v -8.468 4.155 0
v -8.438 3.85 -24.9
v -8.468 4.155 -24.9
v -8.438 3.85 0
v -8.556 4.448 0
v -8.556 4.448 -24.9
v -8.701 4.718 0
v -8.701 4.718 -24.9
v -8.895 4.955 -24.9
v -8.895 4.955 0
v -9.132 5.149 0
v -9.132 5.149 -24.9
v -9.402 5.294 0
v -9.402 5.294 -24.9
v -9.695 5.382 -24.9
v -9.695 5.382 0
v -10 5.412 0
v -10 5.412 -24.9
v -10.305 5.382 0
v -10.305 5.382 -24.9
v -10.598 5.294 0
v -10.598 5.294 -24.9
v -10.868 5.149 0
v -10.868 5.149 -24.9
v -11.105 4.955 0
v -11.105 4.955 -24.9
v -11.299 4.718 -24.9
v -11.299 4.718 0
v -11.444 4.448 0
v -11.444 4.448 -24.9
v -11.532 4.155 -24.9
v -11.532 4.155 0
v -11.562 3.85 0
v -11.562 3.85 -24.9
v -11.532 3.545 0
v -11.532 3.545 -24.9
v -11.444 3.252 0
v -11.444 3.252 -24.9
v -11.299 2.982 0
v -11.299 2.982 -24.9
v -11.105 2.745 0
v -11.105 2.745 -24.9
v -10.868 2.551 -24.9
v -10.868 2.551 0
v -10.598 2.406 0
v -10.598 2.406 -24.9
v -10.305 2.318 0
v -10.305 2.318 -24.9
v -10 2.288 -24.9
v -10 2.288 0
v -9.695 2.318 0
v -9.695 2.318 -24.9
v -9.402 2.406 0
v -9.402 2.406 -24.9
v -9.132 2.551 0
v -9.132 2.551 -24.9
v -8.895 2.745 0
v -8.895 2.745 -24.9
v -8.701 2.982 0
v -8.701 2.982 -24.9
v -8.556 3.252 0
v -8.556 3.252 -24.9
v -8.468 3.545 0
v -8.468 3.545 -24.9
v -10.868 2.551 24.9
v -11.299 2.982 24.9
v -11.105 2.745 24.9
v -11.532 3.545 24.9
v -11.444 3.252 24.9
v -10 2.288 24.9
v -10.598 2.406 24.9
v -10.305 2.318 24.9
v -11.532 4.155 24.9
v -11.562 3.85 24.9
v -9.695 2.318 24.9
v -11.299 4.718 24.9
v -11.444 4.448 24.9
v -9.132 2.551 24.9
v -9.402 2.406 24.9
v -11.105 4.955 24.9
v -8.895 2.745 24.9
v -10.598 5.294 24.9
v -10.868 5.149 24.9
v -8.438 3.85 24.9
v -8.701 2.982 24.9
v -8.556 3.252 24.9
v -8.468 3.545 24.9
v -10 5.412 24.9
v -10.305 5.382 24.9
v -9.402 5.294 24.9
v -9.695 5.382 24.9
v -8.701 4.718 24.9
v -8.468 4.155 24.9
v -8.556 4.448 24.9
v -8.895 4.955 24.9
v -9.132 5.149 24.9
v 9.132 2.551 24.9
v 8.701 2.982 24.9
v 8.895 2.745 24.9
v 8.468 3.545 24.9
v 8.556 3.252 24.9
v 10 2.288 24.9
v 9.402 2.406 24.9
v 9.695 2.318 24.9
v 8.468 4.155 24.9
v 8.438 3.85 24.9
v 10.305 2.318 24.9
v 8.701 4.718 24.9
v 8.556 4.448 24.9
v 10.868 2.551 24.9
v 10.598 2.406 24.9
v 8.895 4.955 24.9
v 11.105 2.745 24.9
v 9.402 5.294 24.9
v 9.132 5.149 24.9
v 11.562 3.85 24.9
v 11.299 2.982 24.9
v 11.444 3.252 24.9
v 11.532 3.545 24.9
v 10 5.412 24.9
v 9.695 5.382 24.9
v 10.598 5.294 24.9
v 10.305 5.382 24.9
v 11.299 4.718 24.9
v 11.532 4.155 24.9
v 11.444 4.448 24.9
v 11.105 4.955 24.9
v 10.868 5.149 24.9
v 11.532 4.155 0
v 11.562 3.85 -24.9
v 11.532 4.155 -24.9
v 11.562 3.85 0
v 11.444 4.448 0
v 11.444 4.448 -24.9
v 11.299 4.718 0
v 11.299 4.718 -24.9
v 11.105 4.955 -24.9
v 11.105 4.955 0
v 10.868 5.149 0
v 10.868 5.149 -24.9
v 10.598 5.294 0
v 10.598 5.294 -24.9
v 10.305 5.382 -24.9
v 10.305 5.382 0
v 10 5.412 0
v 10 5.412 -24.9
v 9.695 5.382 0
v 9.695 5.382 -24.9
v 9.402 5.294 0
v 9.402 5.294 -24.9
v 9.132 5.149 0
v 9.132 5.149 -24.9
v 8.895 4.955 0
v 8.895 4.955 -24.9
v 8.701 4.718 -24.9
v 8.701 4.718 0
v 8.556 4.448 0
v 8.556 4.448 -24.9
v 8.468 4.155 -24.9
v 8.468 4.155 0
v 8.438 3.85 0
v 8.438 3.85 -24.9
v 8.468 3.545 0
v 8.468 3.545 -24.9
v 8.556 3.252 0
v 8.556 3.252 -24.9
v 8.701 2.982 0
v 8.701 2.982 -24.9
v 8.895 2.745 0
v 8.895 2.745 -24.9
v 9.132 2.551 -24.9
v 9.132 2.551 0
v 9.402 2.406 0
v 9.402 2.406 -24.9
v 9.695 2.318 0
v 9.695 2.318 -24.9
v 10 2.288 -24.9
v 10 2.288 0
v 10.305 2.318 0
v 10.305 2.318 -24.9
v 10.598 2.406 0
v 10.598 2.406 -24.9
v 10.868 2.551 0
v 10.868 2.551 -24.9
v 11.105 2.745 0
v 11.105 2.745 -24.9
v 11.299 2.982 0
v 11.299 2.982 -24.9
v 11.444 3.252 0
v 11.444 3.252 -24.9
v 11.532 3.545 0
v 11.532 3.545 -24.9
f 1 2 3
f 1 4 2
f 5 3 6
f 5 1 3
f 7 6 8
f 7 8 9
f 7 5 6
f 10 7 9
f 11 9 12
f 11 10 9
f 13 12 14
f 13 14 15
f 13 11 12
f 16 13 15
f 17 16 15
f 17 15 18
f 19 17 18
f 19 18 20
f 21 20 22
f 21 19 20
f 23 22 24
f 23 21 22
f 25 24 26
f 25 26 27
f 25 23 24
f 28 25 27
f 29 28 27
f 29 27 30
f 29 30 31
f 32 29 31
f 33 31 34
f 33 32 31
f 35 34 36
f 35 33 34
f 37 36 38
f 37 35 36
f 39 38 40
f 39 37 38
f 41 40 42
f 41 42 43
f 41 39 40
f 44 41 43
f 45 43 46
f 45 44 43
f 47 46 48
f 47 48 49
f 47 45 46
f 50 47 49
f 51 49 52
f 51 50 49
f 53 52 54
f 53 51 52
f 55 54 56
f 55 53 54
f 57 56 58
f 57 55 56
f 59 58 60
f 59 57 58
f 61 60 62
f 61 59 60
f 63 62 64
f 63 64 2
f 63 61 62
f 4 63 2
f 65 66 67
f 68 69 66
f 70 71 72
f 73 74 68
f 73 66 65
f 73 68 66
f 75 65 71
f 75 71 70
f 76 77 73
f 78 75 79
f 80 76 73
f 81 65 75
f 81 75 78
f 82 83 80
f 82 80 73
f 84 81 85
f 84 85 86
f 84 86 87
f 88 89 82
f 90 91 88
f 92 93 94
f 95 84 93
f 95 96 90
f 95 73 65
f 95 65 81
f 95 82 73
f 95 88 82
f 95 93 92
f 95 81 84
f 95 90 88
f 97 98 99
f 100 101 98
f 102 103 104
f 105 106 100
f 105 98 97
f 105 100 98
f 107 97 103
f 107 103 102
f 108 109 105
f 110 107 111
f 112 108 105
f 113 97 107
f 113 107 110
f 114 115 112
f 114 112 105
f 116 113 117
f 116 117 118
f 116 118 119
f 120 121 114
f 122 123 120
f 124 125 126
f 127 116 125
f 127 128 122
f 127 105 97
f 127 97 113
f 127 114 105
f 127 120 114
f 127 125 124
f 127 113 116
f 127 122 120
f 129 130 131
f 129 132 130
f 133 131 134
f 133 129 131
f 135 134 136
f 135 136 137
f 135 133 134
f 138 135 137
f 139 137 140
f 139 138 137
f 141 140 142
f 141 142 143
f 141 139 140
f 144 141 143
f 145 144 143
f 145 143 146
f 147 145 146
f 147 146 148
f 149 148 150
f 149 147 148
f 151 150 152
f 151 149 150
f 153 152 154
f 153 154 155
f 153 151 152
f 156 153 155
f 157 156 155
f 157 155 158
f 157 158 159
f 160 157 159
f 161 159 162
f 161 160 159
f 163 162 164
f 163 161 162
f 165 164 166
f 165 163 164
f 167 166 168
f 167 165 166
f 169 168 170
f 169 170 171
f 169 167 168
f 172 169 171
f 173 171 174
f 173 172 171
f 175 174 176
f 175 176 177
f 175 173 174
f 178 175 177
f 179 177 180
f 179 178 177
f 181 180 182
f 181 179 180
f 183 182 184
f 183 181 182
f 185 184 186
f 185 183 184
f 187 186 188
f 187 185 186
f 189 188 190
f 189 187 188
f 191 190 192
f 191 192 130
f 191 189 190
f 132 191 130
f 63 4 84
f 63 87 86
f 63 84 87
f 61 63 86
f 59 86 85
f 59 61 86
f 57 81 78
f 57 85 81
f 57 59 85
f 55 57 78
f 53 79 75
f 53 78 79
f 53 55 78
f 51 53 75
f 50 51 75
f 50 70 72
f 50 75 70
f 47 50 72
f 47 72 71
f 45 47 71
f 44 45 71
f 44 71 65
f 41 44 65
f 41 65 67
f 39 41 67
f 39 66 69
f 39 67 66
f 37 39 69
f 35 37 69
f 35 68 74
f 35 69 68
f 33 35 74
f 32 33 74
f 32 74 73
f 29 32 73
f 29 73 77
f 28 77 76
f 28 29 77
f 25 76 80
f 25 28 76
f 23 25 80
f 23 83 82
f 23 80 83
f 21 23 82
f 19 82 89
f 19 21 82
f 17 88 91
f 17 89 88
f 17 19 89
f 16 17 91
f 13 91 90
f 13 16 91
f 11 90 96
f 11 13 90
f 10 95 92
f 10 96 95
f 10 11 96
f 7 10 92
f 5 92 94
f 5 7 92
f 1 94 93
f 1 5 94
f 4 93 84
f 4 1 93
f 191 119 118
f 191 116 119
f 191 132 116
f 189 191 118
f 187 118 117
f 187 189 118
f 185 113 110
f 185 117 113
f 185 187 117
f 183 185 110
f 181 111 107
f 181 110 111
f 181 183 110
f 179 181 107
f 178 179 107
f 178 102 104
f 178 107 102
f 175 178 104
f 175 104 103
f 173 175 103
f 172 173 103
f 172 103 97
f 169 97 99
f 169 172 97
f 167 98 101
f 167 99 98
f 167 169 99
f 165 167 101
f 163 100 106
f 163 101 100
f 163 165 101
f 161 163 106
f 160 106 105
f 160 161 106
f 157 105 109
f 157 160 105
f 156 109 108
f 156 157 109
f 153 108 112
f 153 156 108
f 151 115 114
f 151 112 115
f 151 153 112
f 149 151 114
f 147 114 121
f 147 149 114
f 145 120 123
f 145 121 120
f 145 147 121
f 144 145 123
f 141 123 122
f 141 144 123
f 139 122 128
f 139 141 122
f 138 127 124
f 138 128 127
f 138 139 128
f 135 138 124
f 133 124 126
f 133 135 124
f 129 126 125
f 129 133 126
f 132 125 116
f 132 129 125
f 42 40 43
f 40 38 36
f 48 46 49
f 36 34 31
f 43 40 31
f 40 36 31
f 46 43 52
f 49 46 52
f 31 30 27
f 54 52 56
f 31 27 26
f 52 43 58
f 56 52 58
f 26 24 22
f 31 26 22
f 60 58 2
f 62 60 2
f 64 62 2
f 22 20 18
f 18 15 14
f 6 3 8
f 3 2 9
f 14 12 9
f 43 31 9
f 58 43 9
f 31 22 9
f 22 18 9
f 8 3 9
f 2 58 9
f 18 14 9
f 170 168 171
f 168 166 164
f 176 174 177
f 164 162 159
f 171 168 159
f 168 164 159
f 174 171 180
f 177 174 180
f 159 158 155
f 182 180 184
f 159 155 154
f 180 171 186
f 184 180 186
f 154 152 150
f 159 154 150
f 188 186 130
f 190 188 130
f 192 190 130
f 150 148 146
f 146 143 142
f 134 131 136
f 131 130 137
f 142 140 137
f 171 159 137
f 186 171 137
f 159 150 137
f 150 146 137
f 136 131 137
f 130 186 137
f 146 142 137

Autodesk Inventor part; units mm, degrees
ref_plane "YZ Plane" through (0, 0, 0) normal (1, 0, 0) x (0, 1, 0)
ref_plane "XZ Plane" through (0, 0, 0) normal (0, 1, 0) x (-1, 0, 0)
ref_plane "XY Plane" through (0, 0, 0) normal (0, 0, 1) x (1, 0, 0)
sketch "Sketch1" plane through (0, 0, 0) normal (0, 0, 1) x (1, 0, 0)
  line L0 (22.9, 0.025) -> (-22.9, 0.025) projected
  line L1 (22.9, 42.1) -> (22.9, 0.025) projected
  line L2 (22.9, 42.1) -> (17.05, 42.1) projected
  line L3 (17.05, 7.7) -> (17.05, 42.1) projected
  line L4 (-17.05, 7.7) -> (17.05, 7.7) projected
  line L5 (-17.05, 7.7) -> (-17.05, 42.1) projected
  line L6 (-17.05, 42.1) -> (-22.9, 42.1) projected
  line L7 (-22.9, 0.025) -> (-22.9, 42.1) projected
  circle A0 centre (19.9, 34.8) radius 2.0625 projected
  circle A1 centre (-19.9, 34.8) radius 2.0625 projected
  circle A2 centre (19.9, 15) radius 2.0625 projected
  circle A3 centre (-19.9, 15) radius 2.0625 projected
  circle A4 centre (10, 3.85) radius 1.5625 projected
  circle A5 centre (-10, 3.85) radius 1.5625 projected
  point P0 (0, 0)
extrude "Extrusion1" add sketch "Sketch1" along normal mid plane 49.8 contours A4 | A5
properties part number "Mounting Bar"
